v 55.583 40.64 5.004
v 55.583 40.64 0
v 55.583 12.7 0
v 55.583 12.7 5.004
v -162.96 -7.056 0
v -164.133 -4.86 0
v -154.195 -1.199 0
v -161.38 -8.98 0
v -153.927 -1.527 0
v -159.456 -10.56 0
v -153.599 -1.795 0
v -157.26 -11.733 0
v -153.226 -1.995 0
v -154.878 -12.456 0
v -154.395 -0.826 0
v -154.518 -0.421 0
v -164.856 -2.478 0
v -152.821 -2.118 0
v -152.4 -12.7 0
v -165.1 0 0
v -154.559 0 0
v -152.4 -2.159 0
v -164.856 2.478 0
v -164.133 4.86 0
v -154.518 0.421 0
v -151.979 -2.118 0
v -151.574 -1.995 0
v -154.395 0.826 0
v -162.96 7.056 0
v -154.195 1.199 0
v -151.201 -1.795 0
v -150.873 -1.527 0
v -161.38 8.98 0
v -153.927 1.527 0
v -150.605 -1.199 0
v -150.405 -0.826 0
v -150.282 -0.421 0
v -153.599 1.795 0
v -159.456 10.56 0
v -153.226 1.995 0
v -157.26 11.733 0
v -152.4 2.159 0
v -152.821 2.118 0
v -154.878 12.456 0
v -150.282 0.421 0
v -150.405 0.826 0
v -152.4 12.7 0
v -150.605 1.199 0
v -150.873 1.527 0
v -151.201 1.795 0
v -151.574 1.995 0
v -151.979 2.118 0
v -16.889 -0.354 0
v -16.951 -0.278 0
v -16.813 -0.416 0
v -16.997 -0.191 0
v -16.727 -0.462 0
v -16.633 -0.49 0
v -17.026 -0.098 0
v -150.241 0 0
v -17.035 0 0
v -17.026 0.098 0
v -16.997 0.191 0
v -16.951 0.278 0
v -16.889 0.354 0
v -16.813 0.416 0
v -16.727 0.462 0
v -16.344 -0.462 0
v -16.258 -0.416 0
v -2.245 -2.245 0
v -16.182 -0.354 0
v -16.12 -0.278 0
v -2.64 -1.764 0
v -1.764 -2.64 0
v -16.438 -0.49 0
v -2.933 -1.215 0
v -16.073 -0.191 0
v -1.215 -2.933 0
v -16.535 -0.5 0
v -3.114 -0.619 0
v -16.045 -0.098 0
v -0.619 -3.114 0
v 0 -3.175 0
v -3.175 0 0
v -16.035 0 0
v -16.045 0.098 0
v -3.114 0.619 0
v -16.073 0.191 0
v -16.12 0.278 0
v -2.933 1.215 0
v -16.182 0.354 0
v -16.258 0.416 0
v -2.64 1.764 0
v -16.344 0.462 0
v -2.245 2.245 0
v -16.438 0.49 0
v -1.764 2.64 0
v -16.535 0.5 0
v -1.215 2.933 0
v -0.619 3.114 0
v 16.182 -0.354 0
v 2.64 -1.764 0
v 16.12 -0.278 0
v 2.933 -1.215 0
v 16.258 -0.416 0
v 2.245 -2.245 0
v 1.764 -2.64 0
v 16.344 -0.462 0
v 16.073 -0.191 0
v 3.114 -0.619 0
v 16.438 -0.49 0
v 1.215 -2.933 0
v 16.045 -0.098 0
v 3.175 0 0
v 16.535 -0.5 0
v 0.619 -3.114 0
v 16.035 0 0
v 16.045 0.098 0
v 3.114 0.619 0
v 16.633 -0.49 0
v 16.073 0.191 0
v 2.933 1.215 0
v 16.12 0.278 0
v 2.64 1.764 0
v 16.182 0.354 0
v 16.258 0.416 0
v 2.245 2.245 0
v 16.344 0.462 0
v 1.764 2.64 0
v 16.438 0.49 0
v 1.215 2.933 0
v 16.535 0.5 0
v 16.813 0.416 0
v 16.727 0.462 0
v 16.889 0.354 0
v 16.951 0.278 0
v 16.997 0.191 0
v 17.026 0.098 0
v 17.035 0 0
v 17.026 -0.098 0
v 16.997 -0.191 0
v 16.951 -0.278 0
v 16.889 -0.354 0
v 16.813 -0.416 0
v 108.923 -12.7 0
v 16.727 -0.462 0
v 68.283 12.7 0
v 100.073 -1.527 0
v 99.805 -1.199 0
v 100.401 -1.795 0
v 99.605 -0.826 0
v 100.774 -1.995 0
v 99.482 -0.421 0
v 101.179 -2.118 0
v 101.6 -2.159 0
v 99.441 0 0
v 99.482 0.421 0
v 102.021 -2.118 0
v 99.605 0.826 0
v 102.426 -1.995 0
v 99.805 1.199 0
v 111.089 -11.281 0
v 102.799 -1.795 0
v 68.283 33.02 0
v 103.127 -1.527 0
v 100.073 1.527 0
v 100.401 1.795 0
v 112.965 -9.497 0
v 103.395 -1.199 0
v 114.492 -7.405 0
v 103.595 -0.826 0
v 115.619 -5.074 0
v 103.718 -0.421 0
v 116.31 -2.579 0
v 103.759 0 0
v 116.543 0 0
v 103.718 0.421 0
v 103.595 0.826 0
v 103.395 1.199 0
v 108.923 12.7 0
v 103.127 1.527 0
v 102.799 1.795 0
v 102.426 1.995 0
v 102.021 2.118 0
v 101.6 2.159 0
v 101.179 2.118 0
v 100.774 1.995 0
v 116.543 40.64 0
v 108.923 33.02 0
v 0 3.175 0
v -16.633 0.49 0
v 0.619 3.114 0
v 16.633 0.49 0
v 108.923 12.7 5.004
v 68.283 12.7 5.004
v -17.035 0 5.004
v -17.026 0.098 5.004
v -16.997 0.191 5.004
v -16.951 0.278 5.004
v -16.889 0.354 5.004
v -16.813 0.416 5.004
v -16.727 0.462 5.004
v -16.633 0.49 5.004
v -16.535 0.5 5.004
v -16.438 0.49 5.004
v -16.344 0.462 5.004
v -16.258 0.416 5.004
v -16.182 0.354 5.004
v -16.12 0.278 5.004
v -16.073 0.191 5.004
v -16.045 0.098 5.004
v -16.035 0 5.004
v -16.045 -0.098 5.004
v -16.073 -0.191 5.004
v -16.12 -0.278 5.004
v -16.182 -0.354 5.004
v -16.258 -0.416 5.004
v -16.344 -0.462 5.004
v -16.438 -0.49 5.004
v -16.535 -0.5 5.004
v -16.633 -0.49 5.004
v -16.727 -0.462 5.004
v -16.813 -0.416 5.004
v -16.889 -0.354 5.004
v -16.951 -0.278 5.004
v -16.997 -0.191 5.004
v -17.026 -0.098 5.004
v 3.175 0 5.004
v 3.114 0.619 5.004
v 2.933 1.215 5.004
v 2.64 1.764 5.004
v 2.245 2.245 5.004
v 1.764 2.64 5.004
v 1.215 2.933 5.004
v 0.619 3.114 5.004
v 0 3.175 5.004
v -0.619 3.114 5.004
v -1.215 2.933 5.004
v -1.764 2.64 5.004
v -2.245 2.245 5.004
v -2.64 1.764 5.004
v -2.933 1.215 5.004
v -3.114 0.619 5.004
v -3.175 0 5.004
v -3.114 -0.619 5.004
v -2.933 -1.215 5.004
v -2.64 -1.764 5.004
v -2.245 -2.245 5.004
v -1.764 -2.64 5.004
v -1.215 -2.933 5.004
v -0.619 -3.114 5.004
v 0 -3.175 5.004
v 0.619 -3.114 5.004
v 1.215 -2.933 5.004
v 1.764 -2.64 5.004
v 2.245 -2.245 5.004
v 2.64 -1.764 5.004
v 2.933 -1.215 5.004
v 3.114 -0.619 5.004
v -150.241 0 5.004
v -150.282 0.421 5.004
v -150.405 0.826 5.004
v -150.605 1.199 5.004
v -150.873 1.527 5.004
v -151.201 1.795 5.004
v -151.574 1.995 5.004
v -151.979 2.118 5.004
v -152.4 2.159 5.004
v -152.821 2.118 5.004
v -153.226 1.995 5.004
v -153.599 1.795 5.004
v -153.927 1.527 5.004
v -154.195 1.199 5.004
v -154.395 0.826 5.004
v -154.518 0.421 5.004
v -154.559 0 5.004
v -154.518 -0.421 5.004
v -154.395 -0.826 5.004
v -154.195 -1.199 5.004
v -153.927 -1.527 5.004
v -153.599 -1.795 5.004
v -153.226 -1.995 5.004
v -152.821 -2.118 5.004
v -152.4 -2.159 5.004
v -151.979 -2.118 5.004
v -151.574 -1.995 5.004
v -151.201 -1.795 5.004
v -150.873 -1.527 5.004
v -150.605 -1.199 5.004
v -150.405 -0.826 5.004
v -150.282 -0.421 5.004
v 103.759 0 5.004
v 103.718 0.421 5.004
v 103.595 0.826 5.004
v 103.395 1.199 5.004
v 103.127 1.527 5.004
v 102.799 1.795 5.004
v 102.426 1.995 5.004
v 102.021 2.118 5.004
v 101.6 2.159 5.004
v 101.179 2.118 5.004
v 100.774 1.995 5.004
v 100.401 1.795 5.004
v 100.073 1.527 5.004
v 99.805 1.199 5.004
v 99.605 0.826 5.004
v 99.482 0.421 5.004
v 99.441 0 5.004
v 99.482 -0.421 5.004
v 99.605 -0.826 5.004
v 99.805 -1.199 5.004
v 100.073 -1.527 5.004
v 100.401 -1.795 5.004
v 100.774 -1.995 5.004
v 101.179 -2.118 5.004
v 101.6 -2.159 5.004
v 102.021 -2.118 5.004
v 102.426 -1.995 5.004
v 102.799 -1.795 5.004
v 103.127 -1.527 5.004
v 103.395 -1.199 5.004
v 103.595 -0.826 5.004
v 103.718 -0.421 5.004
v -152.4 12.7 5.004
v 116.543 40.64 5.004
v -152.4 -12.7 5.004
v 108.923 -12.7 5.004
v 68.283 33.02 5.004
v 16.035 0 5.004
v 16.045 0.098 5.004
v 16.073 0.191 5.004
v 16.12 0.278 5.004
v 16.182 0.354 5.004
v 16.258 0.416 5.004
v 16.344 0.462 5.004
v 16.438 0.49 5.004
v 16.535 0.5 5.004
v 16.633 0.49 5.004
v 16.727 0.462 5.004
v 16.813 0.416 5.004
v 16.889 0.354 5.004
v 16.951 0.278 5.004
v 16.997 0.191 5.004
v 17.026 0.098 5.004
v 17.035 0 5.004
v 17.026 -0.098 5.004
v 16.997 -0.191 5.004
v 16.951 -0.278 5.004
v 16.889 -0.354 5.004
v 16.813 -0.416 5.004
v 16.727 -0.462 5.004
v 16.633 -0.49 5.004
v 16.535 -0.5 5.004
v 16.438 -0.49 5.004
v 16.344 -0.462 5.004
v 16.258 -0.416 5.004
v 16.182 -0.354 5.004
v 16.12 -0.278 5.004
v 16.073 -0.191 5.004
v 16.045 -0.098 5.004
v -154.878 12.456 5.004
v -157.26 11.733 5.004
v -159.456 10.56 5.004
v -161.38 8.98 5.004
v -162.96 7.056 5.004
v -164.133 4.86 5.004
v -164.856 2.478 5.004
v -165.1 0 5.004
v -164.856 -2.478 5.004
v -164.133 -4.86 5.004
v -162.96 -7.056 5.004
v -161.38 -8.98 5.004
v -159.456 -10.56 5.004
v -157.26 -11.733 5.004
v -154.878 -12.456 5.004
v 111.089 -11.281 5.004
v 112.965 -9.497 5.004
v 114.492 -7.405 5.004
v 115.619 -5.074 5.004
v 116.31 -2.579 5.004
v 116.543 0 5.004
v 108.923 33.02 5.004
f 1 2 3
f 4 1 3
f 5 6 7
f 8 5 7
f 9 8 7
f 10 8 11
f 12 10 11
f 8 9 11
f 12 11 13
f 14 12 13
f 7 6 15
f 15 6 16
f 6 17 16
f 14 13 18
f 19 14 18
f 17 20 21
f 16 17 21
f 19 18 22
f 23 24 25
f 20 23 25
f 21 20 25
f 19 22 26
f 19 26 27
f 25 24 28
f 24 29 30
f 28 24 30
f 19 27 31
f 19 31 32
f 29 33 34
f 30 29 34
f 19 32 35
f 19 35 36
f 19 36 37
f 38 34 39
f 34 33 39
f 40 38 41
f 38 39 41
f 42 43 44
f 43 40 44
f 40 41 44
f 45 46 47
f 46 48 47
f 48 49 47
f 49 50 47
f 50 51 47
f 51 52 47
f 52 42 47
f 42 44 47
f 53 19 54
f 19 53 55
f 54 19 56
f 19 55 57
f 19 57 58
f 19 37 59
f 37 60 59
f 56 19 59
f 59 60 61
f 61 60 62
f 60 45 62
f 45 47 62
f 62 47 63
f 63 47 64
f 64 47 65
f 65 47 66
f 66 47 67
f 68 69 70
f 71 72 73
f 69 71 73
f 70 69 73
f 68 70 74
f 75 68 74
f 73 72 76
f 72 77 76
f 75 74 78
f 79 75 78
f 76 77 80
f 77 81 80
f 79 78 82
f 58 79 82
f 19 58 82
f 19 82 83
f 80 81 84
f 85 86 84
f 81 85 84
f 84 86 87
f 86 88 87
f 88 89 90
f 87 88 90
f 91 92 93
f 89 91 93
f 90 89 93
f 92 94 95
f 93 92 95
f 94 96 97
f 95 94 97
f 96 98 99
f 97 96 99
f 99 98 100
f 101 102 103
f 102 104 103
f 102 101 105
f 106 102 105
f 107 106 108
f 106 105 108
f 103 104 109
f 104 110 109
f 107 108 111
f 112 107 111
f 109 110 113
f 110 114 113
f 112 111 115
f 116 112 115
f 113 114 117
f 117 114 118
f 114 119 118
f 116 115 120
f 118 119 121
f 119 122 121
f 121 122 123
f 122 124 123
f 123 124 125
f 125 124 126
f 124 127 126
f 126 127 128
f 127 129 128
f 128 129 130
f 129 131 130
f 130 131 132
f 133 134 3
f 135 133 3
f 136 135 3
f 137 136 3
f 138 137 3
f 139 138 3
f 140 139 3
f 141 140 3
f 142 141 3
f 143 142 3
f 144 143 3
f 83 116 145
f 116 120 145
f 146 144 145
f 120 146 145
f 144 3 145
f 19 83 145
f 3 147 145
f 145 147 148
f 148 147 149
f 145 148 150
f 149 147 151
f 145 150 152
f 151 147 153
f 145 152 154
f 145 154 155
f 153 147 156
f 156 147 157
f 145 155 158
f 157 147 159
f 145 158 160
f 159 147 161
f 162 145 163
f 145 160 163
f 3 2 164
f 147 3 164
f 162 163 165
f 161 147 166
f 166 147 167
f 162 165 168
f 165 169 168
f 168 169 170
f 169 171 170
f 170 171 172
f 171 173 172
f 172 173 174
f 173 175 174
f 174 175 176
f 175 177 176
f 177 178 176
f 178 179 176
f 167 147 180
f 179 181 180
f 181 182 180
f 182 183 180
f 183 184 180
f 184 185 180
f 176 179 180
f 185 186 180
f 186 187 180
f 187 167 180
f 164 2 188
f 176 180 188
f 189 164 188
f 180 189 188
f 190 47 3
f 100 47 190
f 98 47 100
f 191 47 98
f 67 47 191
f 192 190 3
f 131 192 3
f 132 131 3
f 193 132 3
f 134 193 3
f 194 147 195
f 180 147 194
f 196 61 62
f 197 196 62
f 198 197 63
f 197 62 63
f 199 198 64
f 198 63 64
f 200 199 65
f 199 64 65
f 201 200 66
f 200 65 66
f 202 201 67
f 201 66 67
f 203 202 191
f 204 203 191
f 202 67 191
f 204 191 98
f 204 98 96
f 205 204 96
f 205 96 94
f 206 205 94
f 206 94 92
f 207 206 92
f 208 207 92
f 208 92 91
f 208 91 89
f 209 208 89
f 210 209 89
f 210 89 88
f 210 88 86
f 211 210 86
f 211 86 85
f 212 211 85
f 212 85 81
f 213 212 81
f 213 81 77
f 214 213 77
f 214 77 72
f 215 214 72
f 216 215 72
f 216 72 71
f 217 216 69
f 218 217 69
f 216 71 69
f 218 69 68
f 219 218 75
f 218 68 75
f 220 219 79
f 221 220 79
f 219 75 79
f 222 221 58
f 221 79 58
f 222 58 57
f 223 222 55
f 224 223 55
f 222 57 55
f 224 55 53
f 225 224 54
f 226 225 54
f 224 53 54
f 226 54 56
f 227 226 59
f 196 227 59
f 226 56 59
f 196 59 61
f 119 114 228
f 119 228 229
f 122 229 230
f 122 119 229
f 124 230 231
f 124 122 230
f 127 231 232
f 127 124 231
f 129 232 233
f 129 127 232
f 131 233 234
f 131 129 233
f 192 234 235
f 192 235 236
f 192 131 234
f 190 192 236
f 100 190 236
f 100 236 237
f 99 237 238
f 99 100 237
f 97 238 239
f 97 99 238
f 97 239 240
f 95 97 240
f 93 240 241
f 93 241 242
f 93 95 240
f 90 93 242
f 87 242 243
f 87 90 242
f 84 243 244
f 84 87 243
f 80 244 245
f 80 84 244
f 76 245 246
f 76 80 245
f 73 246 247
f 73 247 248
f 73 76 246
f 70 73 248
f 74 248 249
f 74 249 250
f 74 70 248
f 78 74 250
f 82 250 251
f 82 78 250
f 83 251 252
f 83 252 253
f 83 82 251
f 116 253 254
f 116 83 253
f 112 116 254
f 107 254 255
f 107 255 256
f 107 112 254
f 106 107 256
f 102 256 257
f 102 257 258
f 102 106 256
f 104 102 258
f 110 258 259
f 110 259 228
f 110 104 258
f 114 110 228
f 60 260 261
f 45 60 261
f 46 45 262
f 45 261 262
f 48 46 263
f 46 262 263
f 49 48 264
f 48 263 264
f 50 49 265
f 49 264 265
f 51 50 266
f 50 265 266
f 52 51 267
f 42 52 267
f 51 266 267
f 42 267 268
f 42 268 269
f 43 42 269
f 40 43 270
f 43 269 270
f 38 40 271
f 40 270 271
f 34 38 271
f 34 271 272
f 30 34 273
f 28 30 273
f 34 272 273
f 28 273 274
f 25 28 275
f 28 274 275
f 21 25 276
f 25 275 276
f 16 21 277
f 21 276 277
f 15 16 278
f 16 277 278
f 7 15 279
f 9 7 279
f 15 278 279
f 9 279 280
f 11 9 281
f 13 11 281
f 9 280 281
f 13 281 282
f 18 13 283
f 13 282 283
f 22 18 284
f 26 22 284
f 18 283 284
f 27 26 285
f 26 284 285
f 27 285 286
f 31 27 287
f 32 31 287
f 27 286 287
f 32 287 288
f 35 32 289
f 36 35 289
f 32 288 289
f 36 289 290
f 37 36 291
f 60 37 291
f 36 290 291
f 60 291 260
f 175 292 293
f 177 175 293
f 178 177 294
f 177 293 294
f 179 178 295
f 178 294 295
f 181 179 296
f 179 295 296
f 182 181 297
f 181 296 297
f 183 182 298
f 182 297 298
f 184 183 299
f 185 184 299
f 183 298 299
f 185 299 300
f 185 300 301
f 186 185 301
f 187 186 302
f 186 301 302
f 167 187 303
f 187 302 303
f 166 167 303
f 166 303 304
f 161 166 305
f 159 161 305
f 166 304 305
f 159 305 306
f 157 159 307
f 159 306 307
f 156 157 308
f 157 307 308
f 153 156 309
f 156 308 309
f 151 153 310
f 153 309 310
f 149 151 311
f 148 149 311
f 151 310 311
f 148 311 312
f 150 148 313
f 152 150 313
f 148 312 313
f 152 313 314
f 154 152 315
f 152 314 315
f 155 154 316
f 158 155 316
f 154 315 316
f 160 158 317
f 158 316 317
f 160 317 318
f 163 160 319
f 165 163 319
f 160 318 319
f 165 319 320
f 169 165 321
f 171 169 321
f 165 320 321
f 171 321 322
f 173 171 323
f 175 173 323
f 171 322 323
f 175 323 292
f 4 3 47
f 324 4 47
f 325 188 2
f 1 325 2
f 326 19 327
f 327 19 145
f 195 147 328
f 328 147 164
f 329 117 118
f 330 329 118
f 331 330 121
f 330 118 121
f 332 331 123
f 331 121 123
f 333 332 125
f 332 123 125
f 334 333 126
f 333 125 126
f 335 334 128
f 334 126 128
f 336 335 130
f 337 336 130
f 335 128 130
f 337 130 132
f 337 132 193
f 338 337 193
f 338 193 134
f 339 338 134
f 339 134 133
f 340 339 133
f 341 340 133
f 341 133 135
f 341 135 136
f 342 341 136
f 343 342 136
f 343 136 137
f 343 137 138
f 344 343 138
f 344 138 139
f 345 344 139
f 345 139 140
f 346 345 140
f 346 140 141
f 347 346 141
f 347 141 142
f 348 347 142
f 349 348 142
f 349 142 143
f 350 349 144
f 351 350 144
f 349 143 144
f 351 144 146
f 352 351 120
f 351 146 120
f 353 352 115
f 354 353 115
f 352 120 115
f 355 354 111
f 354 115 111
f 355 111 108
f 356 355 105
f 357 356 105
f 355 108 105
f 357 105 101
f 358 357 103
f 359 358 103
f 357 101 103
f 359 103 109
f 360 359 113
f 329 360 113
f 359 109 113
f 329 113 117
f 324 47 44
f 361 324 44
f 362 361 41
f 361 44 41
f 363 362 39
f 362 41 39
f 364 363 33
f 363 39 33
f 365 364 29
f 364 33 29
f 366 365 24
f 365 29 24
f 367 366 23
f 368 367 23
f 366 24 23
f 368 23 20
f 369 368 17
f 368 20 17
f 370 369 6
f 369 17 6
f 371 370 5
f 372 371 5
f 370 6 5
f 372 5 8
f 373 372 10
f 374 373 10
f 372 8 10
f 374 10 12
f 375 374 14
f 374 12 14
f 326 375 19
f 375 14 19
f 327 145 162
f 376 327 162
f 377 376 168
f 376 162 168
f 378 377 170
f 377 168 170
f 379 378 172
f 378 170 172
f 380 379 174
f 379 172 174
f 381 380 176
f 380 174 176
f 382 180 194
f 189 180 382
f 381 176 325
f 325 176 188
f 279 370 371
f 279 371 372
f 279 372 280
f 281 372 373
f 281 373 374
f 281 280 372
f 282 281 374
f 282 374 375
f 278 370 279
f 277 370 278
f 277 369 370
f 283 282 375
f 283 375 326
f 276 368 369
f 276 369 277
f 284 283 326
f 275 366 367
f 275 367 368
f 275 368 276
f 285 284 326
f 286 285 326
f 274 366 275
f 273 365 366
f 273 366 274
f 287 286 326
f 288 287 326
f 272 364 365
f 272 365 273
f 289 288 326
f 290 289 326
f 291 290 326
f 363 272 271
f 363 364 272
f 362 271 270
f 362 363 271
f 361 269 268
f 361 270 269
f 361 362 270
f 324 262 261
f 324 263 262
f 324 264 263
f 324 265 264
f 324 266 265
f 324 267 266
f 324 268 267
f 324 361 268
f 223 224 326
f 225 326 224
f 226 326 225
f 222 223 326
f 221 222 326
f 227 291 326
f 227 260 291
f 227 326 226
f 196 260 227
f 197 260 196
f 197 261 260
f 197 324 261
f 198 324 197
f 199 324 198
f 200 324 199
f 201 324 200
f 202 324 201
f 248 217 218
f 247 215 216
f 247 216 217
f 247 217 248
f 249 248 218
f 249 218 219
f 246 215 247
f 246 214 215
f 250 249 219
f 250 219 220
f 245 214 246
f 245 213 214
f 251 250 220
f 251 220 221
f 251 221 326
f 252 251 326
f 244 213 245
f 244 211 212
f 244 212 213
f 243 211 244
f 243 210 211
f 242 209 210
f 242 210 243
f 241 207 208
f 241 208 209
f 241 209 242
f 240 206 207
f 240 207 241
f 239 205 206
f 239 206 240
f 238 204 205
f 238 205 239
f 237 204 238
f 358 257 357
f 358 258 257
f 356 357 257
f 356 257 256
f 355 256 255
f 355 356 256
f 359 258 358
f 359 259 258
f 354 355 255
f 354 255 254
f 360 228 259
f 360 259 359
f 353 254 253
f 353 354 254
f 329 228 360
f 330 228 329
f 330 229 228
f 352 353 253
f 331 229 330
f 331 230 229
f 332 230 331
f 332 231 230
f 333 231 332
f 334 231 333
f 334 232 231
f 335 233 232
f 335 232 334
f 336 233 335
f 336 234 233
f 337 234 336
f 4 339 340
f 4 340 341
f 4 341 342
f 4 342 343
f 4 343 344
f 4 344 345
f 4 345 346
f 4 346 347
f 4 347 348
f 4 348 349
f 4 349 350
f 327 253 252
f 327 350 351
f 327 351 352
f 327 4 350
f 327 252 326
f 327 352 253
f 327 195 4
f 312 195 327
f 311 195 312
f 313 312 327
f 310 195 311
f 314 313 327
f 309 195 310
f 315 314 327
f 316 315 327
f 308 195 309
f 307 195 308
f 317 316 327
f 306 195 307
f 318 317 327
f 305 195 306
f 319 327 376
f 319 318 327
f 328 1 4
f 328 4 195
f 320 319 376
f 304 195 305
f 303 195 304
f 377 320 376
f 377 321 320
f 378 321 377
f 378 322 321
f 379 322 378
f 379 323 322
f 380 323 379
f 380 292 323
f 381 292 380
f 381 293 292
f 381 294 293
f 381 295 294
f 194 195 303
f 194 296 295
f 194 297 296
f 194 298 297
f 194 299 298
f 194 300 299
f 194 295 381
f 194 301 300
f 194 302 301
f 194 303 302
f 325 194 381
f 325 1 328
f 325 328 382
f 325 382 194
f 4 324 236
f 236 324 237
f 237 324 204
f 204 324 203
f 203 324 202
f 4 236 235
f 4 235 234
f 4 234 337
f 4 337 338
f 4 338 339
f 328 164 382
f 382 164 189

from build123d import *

# Parameters (mm, degrees)
SKETCH1_R           = 6.35
SKETCH1_R_2         = 3.175
SKETCH1_W           = 40.64
SKETCH1_H           = 20.32
BOSS_EXTRUDE1_DEPTH = 5.0038
SKETCH2_R           = 10.425848265
SKETCH2_R_2         = 2.159
SKETCH2_R_3         = 8.142875018
BOSS_EXTRUDE2_DEPTH = 5.0038
SKETCH3_R           = 0.50000027
CUT_EXTRUDE1_DEPTH  = 19.304


with BuildPart() as part:
    # Sketch1 → Boss-Extrude1 (new body)
    with BuildSketch(Plane.XY):
        with BuildLine():
            ThreePointArc((108.923032041, -12.7), (114.491880219, -7.405308906), (116.543032041, 0))
            Line((116.543032041, 0), (116.543032041, 40.64))
            Line((116.543032041, 40.64), (55.583032041, 40.64))
            Line((55.583032041, 40.64), (55.583032041, 12.7))
            Line((55.583032041, 12.7), (-152.4, 12.7))
            ThreePointArc((-152.4, 12.7), (-165.1, 0), (-152.4, -12.7))
            Line((-152.4, -12.7), (108.923032041, -12.7))
        make_face()
        with Locations((-152.4, 0)):
            Circle(SKETCH1_R, mode=Mode.SUBTRACT)
        Circle(SKETCH1_R_2, mode=Mode.SUBTRACT)
        with Locations((101.6, 0)):
            Circle(SKETCH1_R, mode=Mode.SUBTRACT)
        with Locations((88.603032041, 22.86)):
            Rectangle(SKETCH1_W, SKETCH1_H, mode=Mode.SUBTRACT)
    extrude(amount=BOSS_EXTRUDE1_DEPTH)

    # Sketch2 → Boss-Extrude2 (add)
    with BuildSketch(Plane.XY.offset(5.0038)):
        with Locations((-152.4, 0)):
            Circle(SKETCH2_R)
        with Locations((-152.4, 0)):
            Circle(SKETCH2_R_2, mode=Mode.SUBTRACT)
        with Locations((101.6, 0)):
            Circle(SKETCH2_R_3)
        with Locations((101.6, 0)):
            Circle(SKETCH2_R_2, mode=Mode.SUBTRACT)
    extrude(amount=-BOSS_EXTRUDE2_DEPTH)

    # Sketch3 → Cut-Extrude1 (cut)
    with BuildSketch(Plane(origin=(0, 0, 0), x_dir=(-1, 0, 0), z_dir=(0, 0, -1))):
        with Locations((16.5354, 0)):
            Circle(SKETCH3_R)
        with Locations((-16.5354, 0)):
            Circle(SKETCH3_R)
    extrude(amount=-CUT_EXTRUDE1_DEPTH, mode=Mode.SUBTRACT)


solid = part.part
